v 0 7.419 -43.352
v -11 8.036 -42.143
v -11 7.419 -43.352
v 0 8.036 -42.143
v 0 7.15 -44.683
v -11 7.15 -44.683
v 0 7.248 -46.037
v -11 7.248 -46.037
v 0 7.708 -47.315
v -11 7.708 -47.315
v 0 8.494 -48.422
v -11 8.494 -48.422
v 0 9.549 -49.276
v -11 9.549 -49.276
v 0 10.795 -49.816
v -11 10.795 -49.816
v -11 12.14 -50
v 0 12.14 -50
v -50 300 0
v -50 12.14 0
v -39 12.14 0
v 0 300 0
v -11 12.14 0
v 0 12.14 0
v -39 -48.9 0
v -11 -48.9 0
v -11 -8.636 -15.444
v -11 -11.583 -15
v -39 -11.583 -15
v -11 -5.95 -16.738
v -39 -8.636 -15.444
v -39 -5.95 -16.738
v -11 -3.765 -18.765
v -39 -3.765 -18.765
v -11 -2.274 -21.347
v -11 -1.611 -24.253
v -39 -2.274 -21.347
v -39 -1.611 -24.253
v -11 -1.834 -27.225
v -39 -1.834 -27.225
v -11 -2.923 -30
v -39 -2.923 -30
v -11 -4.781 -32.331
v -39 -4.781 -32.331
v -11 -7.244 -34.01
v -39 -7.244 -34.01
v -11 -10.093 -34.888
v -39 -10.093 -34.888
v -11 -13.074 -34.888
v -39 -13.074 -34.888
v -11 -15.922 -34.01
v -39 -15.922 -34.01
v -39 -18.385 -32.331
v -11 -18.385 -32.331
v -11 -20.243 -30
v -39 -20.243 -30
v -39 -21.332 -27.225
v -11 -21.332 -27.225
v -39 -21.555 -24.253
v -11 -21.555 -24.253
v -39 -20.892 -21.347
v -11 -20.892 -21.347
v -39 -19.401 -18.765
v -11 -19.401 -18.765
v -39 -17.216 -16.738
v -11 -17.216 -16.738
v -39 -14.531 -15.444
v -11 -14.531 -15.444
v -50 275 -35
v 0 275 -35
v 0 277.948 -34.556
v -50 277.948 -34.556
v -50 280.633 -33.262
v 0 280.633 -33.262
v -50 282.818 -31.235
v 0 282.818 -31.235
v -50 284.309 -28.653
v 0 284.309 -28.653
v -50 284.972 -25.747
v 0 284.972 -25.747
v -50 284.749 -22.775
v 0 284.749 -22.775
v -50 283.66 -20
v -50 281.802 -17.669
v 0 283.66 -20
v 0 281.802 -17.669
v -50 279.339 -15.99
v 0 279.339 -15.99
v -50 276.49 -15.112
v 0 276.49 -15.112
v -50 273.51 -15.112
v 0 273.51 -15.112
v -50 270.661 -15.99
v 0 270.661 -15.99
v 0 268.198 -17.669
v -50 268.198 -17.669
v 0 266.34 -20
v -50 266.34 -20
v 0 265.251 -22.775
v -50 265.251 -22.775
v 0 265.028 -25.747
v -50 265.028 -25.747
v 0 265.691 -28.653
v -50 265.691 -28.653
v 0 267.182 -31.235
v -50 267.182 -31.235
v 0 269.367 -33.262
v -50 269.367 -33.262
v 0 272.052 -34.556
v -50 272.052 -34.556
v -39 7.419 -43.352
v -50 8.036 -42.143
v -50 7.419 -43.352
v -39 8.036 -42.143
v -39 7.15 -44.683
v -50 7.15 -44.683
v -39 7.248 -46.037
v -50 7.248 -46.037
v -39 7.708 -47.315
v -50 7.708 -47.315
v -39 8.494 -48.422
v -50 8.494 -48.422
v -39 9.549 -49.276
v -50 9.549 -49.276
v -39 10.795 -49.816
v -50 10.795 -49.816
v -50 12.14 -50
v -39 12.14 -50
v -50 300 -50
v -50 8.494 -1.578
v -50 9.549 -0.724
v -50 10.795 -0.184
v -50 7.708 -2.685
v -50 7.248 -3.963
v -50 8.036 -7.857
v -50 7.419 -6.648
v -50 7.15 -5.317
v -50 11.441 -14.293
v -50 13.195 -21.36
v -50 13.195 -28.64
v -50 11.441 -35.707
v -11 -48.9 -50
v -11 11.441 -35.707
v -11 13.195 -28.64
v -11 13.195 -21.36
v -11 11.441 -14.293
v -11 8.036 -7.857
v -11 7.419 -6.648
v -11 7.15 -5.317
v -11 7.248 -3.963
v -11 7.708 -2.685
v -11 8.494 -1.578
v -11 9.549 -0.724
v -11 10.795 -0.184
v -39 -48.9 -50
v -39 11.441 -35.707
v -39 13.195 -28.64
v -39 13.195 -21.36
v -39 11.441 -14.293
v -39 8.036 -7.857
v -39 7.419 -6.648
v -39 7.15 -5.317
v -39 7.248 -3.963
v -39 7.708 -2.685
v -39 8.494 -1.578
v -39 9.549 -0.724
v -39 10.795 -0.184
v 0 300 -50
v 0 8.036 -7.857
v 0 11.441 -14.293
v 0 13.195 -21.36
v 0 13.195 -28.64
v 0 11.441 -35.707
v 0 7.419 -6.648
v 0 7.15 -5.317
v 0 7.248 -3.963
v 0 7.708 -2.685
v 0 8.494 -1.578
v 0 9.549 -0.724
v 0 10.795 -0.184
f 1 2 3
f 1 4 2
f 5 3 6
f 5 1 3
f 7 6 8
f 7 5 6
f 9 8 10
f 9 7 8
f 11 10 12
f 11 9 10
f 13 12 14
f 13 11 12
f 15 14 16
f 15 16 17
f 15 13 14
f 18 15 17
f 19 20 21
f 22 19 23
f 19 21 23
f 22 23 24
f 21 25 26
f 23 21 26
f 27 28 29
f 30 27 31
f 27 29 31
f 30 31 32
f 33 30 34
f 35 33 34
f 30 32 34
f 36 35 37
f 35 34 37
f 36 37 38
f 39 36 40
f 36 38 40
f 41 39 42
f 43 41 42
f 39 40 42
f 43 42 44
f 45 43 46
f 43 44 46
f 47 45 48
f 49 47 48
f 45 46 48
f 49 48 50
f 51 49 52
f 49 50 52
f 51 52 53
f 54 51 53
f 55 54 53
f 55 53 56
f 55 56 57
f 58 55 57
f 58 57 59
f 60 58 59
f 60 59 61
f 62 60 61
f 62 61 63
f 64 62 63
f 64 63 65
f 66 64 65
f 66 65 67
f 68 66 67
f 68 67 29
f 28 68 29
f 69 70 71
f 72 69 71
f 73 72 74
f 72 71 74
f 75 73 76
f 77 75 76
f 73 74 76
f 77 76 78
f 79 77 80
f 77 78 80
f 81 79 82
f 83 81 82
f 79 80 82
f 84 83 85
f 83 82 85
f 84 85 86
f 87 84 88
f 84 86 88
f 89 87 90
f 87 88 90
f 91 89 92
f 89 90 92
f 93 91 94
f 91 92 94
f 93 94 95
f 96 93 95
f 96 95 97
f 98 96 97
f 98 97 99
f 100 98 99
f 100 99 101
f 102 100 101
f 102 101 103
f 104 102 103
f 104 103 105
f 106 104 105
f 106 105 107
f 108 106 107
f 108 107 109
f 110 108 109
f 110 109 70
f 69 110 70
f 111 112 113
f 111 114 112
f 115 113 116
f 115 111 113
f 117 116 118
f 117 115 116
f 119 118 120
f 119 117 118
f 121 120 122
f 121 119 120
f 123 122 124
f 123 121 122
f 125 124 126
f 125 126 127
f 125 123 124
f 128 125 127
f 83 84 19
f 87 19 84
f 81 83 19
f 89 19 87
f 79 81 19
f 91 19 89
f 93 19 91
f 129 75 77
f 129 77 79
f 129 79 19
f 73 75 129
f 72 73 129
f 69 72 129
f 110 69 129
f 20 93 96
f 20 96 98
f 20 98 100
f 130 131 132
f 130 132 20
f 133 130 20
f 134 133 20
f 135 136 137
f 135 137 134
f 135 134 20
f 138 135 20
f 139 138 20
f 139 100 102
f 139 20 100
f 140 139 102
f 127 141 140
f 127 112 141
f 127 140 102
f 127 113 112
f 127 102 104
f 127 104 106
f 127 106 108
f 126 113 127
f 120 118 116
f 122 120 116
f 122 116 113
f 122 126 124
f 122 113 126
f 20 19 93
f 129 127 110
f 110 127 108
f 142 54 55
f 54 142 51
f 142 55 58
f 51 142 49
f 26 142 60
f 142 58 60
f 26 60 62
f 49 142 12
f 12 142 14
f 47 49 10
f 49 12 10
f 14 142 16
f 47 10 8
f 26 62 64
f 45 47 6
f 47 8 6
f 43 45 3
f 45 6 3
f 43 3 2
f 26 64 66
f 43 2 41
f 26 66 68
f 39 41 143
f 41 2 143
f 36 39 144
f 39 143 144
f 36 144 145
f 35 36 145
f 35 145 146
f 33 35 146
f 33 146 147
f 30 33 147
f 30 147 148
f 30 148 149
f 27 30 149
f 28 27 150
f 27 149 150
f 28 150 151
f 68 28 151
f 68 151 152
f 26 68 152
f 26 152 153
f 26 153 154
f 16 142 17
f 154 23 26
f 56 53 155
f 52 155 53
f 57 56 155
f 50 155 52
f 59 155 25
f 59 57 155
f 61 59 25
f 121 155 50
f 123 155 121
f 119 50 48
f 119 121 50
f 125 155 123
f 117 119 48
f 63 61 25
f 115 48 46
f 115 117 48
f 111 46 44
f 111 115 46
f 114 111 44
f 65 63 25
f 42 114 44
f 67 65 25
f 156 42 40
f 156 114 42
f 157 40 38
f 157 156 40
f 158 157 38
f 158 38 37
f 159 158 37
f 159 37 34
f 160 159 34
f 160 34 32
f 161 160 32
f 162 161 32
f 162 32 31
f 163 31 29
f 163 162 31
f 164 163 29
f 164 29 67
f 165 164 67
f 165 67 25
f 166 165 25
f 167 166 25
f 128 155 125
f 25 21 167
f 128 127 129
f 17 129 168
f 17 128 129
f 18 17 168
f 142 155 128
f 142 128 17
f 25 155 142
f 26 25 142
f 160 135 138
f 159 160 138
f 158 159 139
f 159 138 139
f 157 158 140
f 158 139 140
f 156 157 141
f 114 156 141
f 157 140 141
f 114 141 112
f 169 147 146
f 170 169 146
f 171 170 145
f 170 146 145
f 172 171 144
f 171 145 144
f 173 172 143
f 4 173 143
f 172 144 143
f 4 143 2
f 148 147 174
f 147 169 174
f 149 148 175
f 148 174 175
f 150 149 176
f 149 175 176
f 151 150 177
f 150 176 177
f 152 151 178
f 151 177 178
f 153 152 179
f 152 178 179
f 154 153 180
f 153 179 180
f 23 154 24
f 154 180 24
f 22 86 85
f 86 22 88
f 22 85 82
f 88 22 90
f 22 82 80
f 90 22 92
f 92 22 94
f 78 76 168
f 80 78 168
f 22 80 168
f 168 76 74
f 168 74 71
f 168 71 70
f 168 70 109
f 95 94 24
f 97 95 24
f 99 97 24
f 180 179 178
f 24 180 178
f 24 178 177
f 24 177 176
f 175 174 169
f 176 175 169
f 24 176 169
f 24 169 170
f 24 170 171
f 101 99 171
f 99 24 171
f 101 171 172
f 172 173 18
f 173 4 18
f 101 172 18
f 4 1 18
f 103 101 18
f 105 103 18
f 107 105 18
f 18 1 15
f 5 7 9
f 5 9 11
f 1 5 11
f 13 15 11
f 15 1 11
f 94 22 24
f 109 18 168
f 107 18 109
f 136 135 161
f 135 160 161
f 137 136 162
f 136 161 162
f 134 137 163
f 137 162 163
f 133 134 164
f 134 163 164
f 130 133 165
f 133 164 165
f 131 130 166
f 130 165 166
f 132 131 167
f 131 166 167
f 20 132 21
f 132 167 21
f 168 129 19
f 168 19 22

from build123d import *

# Parameters (mm, degrees)
SKETCH1_W               = 50
SKETCH1_H               = 50
BOSS_EXTRUDE1_DEPTH     = 300
SKETCH2_W               = 28
SKETCH2_H               = 50
BOSS_EXTRUDE2_DEPTH     = 48.9
CUT_EXTRUDE4_DEPTH      = 309.220700148
CUT_EXTRUDE4_DEPTH_BACK = 11
CUT_EXTRUDE7_DEPTH      = 11
SKETCH12_R              = 10
CUT_EXTRUDE8_DEPTH      = 307.628439646
FILLET2_R               = 5
FILLET3_R               = 5
SKETCH13_R              = 10
CUT_EXTRUDE9_DEPTH      = 309.220700148


with BuildPart() as part:
    # Sketch1 → Boss-Extrude1 (new body)
    with BuildSketch(Plane(origin=(0, 0, 0), x_dir=(1, 0, 0), z_dir=(0, 1, 0))):
        with Locations((-25, 25)):
            Rectangle(SKETCH1_W, SKETCH1_H)
    extrude(amount=BOSS_EXTRUDE1_DEPTH)

    # Sketch2 → Boss-Extrude2 (add)
    with BuildSketch(Plane.XZ):
        with Locations((-25, -25)):
            Rectangle(SKETCH2_W, SKETCH2_H)
    extrude(amount=BOSS_EXTRUDE2_DEPTH)

    # Sketch5 → Cut-Extrude4 (cut, two sides: drawn at the far end of the back side and taken through both)
    with BuildSketch(Plane(origin=(0, 0, 0), x_dir=(0, 0, -1), z_dir=(1, 0, 0)).offset(-CUT_EXTRUDE4_DEPTH_BACK)):
        with BuildLine():
            Line((50, 0), (0, 0))
            ThreePointArc((0, 0), (25, 13.416876048), (50, 0))
        make_face()
    extrude(amount=CUT_EXTRUDE4_DEPTH + CUT_EXTRUDE4_DEPTH_BACK, mode=Mode.SUBTRACT)

    # Sketch6 → Cut-Extrude7 (cut)
    with BuildSketch(Plane.ZY.offset(50)):
        with BuildLine():
            Line((-50, 0), (0, 0))
            ThreePointArc((0, 0), (-25, 13.416876048), (-50, 0))
        make_face()
    extrude(amount=-CUT_EXTRUDE7_DEPTH, mode=Mode.SUBTRACT)

    # Sketch12 → Cut-Extrude8 (cut, through all)
    with BuildSketch(Plane.ZY.offset(39)):
        with Locations((-25, -11.583123952)):
            Circle(SKETCH12_R)
    extrude(amount=-CUT_EXTRUDE8_DEPTH, mode=Mode.SUBTRACT)

    # Fillet2
    fillet2_edges = [part.edges().sort_by_distance(p)[0] for p in [
        (-44.5, 0, -50),
        (-44.5, 0, 0),
    ]]
    fillet(fillet2_edges, radius=FILLET2_R)

    # Fillet3
    fillet3_edges = [part.edges().sort_by_distance(p)[0] for p in [
        (-5.5, 0, 0),
        (-5.5, 0, -50),
    ]]
    fillet(fillet3_edges, radius=FILLET3_R)

    # Sketch13 → Cut-Extrude9 (cut, through all)
    with BuildSketch(Plane(origin=(0, 0, 0), x_dir=(0, 0, -1), z_dir=(1, 0, 0))):
        with Locations((25, 275)):
            Circle(SKETCH13_R)
    extrude(amount=-CUT_EXTRUDE9_DEPTH, mode=Mode.SUBTRACT)


solid = part.part
